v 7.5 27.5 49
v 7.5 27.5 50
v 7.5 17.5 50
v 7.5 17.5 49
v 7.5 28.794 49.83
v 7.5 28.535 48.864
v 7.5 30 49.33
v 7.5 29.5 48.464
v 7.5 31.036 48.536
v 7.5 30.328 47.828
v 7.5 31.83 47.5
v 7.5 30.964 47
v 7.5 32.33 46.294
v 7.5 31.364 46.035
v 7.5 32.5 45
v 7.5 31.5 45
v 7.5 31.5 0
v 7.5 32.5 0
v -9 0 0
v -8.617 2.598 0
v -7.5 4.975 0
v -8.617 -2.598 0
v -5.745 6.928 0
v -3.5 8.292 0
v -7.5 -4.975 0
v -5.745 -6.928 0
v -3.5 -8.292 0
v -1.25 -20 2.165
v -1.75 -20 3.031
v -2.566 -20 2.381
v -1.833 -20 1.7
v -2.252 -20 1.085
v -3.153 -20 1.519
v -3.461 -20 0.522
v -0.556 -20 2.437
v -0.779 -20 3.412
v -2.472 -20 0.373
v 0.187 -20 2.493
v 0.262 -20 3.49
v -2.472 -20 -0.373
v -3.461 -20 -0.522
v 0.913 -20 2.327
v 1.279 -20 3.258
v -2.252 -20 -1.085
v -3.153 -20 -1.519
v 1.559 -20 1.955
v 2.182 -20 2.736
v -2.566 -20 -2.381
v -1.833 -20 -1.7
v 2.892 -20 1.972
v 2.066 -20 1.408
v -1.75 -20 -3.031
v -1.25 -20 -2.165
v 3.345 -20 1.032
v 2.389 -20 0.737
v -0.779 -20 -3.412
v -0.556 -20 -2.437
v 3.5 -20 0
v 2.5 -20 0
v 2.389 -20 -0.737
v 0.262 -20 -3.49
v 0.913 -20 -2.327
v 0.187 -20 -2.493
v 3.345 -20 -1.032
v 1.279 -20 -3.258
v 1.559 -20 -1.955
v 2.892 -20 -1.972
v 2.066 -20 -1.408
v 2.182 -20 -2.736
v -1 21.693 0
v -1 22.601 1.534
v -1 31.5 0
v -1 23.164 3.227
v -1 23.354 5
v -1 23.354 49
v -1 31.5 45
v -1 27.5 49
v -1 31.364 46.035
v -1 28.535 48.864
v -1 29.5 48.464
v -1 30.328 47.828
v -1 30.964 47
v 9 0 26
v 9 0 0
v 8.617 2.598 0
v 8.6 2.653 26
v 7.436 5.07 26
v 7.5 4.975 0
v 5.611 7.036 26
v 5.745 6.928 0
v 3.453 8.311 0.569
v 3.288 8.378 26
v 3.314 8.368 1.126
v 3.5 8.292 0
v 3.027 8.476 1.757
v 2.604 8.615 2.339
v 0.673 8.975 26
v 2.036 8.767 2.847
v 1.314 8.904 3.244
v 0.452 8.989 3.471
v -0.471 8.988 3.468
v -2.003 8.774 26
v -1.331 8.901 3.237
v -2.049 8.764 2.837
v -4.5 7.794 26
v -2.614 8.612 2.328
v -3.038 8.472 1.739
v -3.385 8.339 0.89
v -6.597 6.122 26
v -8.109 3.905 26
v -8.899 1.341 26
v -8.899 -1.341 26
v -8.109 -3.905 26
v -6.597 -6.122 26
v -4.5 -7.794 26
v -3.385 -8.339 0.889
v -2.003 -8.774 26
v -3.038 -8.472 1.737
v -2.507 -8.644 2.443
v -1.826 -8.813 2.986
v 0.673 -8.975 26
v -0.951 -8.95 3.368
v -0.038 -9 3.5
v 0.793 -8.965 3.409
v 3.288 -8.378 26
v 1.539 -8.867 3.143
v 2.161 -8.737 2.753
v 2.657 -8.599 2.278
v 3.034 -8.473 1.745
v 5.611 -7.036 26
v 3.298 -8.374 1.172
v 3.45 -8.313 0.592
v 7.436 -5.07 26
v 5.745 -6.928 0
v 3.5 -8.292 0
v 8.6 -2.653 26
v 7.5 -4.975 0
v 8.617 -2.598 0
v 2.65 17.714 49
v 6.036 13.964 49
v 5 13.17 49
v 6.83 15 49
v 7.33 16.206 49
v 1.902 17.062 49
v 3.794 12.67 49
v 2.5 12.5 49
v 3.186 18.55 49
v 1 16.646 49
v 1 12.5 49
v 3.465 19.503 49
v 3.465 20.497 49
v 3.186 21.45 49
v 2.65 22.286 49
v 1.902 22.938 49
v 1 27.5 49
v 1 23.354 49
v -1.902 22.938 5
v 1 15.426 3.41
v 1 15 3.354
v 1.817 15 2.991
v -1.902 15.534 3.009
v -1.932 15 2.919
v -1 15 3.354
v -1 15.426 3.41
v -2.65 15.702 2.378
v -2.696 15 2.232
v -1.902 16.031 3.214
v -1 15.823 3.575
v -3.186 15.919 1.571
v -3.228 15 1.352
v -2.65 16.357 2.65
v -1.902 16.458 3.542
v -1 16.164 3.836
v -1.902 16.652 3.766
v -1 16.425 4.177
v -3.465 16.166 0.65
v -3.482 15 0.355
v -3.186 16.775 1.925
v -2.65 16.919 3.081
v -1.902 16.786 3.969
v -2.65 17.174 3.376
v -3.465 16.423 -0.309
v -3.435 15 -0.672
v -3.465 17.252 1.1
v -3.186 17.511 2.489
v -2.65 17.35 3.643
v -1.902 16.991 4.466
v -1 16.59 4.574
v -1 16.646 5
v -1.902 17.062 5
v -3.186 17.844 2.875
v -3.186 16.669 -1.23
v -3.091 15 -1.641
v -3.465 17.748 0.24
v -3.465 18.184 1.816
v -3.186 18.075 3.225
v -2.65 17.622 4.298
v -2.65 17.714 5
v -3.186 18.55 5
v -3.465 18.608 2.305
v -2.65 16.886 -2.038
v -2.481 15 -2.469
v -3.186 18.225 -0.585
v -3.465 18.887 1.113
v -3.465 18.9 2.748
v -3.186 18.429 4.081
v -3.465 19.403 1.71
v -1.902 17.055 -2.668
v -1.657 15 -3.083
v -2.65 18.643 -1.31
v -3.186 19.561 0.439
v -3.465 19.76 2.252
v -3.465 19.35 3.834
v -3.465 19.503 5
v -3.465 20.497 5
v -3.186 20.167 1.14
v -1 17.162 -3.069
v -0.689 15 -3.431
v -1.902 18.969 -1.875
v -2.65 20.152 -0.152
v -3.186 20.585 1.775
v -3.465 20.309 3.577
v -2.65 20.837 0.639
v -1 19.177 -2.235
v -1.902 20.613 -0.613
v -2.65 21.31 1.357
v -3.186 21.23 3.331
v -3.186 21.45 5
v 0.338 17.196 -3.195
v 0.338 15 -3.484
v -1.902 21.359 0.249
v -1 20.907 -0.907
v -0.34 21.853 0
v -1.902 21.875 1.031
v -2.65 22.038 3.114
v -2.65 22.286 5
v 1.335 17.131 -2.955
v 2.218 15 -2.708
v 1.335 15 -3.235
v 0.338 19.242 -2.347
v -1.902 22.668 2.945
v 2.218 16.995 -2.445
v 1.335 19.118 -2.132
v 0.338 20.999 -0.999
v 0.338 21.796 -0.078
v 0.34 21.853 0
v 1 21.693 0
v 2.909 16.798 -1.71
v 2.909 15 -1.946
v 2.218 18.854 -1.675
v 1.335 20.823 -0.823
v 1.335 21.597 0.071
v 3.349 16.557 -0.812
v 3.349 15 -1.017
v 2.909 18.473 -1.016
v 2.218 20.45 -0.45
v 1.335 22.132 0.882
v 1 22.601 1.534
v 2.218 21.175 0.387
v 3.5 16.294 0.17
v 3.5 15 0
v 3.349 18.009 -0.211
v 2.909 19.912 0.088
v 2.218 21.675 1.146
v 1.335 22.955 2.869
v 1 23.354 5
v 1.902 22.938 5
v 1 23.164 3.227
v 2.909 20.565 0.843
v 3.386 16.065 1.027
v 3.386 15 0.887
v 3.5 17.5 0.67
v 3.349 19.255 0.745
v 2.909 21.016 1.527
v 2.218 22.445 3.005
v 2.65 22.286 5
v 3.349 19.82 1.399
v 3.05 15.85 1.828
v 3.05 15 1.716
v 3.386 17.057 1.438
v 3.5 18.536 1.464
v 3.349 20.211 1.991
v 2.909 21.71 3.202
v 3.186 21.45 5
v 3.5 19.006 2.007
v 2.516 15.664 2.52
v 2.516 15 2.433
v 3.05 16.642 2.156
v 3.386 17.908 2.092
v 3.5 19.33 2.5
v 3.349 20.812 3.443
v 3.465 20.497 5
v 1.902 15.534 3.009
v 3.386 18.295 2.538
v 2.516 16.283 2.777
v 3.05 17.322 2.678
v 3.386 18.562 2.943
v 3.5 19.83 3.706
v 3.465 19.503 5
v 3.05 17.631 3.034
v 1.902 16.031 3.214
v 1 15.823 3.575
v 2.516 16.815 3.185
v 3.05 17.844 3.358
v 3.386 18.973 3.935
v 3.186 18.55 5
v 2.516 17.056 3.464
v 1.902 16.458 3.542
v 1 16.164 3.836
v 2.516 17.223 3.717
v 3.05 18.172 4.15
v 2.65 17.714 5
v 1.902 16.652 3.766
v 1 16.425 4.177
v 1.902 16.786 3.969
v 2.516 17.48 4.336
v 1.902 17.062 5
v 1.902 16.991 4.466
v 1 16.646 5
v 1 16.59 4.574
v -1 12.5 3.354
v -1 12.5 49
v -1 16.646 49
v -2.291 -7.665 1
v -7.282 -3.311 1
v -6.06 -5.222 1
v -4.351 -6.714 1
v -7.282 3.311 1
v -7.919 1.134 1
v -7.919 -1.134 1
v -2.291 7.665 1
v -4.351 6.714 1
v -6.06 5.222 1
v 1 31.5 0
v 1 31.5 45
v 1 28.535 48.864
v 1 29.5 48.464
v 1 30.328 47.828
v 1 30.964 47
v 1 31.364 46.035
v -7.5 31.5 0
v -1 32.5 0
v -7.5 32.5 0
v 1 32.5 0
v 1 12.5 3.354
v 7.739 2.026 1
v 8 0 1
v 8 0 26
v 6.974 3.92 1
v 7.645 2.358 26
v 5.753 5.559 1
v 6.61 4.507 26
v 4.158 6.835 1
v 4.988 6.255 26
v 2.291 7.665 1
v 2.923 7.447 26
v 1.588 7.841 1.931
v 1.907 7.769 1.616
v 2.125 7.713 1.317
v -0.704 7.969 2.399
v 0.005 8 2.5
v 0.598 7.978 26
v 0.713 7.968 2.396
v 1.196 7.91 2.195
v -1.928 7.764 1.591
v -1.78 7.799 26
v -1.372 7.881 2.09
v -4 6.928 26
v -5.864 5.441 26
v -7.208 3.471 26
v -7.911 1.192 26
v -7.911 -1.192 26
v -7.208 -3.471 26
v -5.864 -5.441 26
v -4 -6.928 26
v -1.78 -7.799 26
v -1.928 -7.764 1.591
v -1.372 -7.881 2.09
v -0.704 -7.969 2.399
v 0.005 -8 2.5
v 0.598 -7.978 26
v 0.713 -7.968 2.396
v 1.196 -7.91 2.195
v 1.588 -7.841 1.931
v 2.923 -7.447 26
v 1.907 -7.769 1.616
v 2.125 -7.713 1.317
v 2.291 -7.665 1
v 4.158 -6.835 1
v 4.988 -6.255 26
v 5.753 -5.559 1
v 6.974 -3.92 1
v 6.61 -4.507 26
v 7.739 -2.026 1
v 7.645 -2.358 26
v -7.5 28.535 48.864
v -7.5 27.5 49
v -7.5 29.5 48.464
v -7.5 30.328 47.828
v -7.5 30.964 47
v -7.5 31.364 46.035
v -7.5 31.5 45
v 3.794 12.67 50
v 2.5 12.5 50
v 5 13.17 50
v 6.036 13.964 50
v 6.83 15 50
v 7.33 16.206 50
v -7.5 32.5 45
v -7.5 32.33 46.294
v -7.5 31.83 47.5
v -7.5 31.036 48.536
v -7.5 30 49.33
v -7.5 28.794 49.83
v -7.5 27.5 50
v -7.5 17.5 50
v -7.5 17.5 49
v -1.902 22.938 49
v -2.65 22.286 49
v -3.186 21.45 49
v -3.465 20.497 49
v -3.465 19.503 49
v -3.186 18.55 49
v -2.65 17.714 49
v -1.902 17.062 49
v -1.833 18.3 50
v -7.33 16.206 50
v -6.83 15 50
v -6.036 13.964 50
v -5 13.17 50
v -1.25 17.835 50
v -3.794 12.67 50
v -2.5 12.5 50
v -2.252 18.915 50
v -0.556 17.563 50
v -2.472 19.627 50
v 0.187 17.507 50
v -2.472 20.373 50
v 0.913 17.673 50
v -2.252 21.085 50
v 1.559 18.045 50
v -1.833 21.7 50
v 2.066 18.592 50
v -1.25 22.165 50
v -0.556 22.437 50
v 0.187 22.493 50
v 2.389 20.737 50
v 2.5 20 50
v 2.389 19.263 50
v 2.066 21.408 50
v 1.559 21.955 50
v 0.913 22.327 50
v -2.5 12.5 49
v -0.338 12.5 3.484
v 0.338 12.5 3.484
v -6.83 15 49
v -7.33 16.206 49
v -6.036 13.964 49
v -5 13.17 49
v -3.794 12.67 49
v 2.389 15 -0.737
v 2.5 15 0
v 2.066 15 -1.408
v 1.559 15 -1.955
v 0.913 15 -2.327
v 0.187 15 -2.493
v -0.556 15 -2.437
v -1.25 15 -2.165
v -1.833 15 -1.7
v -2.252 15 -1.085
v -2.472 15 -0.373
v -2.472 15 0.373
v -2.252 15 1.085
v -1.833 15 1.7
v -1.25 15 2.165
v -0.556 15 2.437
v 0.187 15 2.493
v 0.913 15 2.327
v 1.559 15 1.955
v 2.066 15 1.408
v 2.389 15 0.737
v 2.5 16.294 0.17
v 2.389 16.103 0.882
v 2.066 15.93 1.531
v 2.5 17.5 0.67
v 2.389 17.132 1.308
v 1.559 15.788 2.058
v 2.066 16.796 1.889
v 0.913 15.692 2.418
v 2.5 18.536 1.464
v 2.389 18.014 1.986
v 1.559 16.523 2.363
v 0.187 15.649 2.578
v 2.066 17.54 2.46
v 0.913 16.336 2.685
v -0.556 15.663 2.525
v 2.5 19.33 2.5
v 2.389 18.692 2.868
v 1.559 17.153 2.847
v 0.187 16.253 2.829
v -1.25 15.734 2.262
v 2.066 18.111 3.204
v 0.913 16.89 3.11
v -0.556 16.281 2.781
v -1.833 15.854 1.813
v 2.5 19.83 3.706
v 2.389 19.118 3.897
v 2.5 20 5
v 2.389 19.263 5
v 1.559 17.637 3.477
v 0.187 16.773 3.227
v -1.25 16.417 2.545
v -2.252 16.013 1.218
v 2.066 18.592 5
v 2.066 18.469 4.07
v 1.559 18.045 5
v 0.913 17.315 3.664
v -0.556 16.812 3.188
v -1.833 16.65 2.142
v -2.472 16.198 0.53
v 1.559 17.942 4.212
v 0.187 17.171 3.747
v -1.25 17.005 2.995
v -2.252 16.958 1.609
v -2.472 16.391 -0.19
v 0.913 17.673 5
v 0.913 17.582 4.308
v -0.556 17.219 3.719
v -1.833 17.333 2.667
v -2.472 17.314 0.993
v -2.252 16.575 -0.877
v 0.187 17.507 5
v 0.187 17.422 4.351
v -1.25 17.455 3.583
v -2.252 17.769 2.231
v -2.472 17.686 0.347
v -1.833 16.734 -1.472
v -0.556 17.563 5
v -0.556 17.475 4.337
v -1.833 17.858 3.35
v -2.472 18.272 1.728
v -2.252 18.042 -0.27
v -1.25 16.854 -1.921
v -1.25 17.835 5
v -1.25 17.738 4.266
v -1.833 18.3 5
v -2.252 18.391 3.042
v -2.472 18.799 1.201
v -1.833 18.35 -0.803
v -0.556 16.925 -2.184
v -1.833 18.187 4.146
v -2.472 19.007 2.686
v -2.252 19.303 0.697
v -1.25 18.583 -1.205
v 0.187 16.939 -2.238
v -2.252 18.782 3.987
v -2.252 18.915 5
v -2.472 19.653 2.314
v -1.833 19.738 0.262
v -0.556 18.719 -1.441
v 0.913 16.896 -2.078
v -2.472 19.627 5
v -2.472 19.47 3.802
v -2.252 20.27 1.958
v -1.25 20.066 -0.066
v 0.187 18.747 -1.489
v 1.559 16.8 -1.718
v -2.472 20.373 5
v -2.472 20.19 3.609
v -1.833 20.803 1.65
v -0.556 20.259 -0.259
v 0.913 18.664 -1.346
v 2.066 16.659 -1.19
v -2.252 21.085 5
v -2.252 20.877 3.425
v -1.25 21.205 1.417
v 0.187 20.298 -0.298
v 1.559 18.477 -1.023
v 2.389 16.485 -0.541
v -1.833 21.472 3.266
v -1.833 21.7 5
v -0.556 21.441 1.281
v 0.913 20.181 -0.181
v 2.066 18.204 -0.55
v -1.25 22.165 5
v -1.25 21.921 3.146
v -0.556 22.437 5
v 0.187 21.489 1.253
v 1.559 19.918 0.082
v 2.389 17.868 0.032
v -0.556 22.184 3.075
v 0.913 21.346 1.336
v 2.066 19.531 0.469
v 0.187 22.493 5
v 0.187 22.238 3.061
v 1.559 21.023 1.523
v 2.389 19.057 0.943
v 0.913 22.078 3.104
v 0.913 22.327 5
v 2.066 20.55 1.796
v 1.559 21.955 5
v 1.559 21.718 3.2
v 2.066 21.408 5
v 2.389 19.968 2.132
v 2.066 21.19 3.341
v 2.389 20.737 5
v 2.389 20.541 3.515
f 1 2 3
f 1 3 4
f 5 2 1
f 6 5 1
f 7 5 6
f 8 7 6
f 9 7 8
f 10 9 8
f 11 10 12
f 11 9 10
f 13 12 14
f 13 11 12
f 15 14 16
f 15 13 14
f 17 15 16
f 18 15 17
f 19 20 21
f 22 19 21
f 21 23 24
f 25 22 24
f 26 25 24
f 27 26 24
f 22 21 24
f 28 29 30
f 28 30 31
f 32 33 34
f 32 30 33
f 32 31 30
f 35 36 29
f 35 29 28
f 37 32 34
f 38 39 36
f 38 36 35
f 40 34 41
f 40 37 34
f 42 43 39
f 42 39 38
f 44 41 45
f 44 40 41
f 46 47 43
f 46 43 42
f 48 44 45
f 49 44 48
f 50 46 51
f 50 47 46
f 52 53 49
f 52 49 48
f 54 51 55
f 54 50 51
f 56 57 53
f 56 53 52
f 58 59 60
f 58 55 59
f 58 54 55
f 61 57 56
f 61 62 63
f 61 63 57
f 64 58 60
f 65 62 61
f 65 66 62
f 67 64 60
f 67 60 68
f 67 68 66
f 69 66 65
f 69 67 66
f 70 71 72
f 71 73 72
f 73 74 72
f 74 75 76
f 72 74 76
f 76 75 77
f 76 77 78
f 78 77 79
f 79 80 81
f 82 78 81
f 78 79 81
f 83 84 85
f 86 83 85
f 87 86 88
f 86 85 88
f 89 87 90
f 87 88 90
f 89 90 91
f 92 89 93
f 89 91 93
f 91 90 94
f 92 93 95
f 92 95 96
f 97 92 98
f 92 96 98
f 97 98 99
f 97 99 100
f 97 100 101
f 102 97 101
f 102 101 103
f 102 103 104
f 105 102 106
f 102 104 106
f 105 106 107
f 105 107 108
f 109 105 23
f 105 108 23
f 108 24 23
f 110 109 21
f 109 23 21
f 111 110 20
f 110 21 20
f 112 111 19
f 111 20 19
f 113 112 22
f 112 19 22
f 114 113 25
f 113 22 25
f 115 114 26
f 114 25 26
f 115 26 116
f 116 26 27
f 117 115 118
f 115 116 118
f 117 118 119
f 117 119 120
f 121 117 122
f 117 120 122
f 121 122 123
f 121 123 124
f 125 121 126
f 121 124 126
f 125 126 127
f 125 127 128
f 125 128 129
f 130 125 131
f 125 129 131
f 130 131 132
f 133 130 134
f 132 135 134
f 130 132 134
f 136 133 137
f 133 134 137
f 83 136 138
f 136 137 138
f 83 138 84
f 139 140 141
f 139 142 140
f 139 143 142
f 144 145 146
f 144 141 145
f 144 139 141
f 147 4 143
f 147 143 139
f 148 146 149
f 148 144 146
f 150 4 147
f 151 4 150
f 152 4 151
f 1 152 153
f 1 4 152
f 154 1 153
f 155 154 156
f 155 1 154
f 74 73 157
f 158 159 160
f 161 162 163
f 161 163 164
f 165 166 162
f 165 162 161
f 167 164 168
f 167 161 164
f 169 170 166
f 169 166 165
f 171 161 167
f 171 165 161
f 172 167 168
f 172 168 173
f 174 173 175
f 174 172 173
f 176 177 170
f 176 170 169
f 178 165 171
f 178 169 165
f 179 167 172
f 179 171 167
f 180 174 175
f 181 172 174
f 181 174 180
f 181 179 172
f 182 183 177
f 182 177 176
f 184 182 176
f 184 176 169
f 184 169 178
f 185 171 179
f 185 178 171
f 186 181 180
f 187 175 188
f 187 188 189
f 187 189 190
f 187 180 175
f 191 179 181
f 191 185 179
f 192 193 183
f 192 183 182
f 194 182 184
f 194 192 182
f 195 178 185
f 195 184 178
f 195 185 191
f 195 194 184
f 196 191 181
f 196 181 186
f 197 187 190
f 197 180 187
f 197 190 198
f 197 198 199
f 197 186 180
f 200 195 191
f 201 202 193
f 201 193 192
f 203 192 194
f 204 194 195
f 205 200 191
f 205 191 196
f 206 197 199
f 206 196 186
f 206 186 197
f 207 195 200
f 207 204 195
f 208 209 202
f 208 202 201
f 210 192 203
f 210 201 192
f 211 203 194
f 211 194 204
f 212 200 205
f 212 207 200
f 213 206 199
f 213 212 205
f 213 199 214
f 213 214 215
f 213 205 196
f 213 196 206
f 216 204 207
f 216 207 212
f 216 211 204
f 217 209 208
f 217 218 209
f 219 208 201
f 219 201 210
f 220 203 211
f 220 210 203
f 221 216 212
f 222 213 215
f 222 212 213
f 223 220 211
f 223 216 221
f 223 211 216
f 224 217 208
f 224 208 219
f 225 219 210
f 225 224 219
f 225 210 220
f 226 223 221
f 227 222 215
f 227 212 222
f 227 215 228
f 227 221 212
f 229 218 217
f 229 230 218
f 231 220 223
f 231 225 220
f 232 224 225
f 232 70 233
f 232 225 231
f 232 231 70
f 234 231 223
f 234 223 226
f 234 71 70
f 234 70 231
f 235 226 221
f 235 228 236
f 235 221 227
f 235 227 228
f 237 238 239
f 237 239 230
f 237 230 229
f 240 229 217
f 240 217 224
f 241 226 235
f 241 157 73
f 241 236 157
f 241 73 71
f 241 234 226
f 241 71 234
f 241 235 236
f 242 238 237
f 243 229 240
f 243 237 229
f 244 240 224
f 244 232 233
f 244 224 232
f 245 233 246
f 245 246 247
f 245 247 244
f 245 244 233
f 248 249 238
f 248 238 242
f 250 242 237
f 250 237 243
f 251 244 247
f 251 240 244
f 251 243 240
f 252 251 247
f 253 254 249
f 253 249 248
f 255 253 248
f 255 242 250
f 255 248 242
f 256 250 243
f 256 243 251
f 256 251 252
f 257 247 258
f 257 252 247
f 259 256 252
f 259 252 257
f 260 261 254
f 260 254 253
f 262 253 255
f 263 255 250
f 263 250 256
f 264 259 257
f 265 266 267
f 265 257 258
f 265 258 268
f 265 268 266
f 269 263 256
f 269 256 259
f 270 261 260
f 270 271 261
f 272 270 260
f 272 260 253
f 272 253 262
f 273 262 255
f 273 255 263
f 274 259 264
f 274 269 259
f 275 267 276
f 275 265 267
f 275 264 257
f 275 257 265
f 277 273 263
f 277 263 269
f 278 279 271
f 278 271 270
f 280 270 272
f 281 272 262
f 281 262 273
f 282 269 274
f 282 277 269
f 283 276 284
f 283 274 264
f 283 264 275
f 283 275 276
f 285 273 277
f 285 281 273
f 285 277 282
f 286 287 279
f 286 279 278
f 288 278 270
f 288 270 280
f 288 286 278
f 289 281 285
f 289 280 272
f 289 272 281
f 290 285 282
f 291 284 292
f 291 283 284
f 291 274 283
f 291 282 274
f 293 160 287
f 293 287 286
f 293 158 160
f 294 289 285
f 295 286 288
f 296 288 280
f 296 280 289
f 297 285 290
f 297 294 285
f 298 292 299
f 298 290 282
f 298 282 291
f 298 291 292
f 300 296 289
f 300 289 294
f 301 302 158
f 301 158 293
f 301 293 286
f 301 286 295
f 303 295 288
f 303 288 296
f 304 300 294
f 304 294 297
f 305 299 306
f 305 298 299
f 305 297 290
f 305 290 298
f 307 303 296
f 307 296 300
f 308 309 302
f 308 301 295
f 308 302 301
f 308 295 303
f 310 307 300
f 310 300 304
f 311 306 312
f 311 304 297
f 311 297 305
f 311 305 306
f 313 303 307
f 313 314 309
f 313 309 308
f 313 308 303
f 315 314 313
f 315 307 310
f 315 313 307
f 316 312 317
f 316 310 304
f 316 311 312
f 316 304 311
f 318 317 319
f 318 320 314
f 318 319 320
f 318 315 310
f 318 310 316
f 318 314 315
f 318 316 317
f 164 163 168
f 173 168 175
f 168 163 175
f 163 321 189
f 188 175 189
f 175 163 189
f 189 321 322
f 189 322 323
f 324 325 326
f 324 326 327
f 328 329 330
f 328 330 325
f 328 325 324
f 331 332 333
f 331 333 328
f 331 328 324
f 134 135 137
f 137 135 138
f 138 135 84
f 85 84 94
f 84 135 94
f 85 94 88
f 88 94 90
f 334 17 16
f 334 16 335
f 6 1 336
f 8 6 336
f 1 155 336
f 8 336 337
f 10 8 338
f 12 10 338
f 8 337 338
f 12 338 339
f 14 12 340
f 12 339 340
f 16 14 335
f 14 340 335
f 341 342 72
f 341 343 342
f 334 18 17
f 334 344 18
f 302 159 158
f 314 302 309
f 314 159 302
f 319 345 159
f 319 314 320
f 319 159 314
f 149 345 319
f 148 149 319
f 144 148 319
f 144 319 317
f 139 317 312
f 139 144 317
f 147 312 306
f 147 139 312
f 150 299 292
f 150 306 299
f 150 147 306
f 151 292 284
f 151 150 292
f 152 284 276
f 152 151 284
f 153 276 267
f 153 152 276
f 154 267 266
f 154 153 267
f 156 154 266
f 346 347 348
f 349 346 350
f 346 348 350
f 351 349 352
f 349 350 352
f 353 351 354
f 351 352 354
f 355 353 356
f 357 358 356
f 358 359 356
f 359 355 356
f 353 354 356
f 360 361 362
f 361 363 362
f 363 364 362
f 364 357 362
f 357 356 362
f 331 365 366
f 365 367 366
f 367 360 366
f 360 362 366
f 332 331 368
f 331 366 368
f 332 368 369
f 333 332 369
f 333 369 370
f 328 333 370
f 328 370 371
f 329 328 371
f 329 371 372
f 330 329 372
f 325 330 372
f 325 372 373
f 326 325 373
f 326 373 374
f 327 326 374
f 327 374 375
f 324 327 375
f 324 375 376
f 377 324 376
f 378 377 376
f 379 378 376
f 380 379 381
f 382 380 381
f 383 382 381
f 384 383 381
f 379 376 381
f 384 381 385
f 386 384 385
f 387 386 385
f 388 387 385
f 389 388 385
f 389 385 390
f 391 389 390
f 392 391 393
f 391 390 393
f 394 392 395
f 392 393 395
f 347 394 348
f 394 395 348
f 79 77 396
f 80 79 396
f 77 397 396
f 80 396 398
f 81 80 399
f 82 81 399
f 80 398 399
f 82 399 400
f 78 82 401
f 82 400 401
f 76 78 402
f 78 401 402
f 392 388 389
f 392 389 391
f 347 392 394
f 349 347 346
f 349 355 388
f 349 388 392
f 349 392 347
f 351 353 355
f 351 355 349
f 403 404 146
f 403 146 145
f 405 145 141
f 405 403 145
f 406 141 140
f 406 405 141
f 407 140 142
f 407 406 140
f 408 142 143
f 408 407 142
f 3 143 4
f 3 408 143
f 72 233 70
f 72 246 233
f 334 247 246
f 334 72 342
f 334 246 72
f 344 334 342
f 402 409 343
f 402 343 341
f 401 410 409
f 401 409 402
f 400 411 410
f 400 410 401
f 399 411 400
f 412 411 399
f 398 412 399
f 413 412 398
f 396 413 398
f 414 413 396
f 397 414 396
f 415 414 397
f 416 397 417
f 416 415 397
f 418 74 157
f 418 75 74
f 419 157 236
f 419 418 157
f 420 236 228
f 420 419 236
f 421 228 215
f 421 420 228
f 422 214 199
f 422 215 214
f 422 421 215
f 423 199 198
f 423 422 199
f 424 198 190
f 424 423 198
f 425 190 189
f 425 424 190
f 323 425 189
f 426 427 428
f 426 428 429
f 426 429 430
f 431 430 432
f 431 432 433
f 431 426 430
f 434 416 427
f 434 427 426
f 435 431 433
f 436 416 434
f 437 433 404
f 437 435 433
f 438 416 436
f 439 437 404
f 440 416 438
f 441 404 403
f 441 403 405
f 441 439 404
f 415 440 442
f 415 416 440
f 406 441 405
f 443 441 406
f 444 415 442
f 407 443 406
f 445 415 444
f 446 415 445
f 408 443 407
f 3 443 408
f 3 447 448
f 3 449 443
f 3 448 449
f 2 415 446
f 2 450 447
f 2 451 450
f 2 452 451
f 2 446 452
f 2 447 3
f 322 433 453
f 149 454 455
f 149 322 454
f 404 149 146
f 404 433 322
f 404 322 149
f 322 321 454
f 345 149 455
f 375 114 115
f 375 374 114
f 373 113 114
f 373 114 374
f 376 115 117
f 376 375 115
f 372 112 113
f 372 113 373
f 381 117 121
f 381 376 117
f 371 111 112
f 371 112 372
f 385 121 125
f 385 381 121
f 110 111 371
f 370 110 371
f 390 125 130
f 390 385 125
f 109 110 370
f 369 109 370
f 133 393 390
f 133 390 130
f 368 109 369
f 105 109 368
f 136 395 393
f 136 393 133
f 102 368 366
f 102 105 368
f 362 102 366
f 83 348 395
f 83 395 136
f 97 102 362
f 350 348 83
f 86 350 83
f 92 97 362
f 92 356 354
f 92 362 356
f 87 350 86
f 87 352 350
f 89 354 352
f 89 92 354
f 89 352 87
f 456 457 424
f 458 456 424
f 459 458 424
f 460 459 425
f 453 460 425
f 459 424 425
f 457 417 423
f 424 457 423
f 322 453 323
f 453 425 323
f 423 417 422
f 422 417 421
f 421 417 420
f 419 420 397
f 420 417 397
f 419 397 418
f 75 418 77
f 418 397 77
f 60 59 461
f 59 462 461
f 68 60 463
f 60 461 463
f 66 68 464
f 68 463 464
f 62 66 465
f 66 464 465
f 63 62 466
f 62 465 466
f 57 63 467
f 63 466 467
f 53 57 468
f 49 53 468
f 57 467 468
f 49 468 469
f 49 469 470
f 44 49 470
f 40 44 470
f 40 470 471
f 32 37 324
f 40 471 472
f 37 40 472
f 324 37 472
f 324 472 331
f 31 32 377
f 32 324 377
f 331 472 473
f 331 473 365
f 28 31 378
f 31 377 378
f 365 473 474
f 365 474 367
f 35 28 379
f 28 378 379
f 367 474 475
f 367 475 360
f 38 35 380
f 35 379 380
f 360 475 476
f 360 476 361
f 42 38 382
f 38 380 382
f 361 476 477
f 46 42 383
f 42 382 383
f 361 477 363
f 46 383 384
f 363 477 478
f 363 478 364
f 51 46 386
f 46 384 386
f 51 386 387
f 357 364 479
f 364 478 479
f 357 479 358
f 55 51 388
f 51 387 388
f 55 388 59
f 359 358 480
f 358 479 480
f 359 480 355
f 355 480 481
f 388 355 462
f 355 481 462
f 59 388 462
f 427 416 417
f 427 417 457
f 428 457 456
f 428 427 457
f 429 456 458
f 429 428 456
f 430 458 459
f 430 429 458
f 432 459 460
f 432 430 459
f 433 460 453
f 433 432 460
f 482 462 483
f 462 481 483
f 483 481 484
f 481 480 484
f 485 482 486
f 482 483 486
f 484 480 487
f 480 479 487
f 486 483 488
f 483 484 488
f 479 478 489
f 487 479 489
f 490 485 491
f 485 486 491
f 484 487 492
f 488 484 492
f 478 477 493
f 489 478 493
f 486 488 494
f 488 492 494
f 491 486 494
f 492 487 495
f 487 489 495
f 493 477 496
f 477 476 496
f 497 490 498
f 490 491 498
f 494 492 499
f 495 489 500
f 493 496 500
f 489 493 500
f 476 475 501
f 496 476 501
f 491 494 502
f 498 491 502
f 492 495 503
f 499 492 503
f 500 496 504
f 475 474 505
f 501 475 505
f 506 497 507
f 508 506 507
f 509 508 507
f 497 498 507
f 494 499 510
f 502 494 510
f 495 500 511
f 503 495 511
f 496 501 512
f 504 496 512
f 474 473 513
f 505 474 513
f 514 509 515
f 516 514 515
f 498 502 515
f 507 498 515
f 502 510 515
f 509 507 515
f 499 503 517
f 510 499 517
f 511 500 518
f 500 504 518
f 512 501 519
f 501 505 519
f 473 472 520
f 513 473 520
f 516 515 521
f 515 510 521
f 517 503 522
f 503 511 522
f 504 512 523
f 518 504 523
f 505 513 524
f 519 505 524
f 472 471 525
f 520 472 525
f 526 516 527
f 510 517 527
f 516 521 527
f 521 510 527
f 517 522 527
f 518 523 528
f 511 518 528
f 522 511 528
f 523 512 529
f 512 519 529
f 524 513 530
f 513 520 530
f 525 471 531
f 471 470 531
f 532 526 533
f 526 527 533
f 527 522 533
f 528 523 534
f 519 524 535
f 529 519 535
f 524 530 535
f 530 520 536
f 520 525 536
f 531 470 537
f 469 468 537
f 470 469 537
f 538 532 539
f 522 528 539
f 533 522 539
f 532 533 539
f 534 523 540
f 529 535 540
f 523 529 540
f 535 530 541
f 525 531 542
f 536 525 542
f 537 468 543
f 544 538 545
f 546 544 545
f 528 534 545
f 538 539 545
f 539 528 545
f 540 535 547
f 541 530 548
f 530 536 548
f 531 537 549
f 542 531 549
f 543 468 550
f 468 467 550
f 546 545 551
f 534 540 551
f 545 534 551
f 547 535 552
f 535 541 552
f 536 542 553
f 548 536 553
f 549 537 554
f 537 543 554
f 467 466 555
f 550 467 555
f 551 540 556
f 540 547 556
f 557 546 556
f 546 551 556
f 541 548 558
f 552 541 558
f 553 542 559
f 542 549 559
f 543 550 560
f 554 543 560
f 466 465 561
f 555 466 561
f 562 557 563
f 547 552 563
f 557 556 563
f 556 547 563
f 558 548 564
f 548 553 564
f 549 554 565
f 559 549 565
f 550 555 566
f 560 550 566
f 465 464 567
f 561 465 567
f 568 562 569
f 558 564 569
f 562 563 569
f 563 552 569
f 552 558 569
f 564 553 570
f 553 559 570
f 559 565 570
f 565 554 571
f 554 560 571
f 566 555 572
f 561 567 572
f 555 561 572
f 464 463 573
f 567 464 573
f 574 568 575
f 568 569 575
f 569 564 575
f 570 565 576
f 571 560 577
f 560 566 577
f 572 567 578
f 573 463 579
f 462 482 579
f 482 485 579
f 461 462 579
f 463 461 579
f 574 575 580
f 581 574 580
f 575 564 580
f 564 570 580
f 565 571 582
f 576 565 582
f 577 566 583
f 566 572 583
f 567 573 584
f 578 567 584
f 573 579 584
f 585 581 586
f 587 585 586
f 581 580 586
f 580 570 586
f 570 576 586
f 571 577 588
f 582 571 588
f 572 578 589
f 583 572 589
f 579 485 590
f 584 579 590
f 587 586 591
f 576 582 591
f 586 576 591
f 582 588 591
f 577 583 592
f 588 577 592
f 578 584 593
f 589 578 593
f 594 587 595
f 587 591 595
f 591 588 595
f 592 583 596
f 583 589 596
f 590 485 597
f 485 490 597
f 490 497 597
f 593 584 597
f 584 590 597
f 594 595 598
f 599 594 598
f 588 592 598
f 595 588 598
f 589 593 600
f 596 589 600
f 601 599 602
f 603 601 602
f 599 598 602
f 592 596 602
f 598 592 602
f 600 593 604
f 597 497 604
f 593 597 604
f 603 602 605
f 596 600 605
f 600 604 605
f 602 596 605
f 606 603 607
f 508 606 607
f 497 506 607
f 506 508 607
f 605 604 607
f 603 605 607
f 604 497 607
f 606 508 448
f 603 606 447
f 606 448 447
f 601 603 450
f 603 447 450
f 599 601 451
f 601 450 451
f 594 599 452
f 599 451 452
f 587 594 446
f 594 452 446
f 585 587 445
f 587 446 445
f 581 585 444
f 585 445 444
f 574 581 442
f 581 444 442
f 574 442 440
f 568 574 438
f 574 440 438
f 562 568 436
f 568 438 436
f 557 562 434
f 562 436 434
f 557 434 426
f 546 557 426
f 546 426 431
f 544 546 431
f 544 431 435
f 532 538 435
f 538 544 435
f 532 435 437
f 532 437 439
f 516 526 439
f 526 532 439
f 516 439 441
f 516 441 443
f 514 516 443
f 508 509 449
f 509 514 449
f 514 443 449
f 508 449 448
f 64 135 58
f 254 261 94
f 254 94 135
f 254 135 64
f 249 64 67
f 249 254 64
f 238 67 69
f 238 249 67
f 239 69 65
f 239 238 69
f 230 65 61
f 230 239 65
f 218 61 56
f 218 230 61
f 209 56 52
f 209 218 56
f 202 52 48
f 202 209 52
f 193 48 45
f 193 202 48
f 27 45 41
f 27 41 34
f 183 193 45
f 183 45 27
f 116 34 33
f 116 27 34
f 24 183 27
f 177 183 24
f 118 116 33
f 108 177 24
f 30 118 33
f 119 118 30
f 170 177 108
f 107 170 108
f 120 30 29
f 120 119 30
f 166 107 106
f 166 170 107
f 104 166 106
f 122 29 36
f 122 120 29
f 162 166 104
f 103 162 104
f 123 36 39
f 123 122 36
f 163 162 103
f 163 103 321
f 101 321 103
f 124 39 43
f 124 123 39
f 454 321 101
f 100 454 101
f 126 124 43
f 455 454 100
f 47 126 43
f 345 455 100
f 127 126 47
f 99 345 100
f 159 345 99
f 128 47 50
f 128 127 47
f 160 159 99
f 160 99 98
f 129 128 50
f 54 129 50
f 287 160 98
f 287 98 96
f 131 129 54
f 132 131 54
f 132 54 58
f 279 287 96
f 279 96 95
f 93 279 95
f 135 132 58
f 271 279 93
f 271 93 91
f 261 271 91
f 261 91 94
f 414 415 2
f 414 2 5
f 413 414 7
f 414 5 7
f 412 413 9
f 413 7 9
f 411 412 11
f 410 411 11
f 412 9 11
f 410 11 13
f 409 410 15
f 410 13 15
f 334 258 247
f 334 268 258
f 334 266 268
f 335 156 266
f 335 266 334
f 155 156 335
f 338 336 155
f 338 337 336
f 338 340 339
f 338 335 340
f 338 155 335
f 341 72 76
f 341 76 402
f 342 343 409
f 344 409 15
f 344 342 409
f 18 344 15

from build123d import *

# Parameters (mm, degrees)
F0_R       = 9
F1_DEPTH   = 26
F3_DEPTH   = 1
F4_R       = 3.5
F7_R       = 2.5
F9_R       = 8
F10_DEPTH  = 25
F13_DEPTH  = 1
F13_FACE_W = 6.5
F13_FACE_H = 1


with BuildPart() as f1:
    # F0 (on Top) → F1 (new body)
    with BuildSketch(Plane.XY):
        Circle(F0_R)
    extrude(amount=F1_DEPTH)



with BuildPart() as f3:
    # F2 (on Right) → F3 (new body, symmetric)
    with BuildSketch(Plane.YZ):
        with BuildLine():
            Line((12.5, 0), (32.5, 0))
            Line((32.5, 0), (32.5, 45))
            ThreePointArc((32.5, 45), (31.0355339059, 48.5355339059), (27.5, 50))
            Line((27.5, 50), (12.5, 50))
            Line((12.5, 50), (12.5, 0))
        make_face()
    extrude(amount=F3_DEPTH, both=True)


with BuildPart() as f1_1:
    add(f1.part)

    add(f3.part)  # F6 merges F3
    # F6: sweep along a path in F5
    with BuildLine(Plane.YZ) as f6_path:
        Line((-20, 0), (0, 0))
        Line((0, 0), (15, 0))
        ThreePointArc((15, 0), (18.5355339059, 1.4644660941), (20, 5))
        Line((20, 5), (20, 50))
    # F4 (on Front) → F6 (sweep)
    with BuildSketch(Plane.XZ):
        Circle(F4_R)
    sweep(path=f6_path.line)

    # F8: sweep along a path in F5
    with BuildLine(Plane.YZ) as f8_path:
        Line((-20, 0), (0, 0))
        Line((0, 0), (15, 0))
        ThreePointArc((15, 0), (18.5355339059, 1.4644660941), (20, 5))
        Line((20, 5), (20, 50))
    # F7 (on face) → F8 (sweep, cut)
    with BuildSketch(Plane.XZ.offset(20)):
        Circle(F7_R)
    sweep(path=f8_path.line, mode=Mode.SUBTRACT)

    # F9 (on face) → F10 (cut)
    with BuildSketch(Plane.XY.offset(26)):
        Circle(F9_R)
    extrude(amount=-F10_DEPTH, mode=Mode.SUBTRACT)

    # F12 (on face) → F13 (join)
    with BuildSketch(Plane.XY.offset(50)):
        with BuildLine():
            Line((7.5, 25), (1, 25))
            Line((1, 25), (1, 23.3541019662))
            ThreePointArc((1, 23.3541019662), (3.5, 20), (1, 16.6458980338))
            Line((1, 16.6458980338), (1, 12.5))
            Line((1, 12.5), (2.5, 12.5))
            ThreePointArc((2.5, 12.5), (6.0355339059, 13.9644660941), (7.5, 17.5))
            Line((7.5, 17.5), (7.5, 25))
        make_face()
        with BuildLine():
            Line((-1, 25), (-7.5, 25))
            Line((-7.5, 25), (-7.5, 17.5))
            ThreePointArc((-7.5, 17.5), (-6.0355339059, 13.9644660941), (-2.5, 12.5))
            Line((-2.5, 12.5), (-1, 12.5))
            Line((-1, 12.5), (-1, 16.6458980338))
            ThreePointArc((-1, 16.6458980338), (-3.5, 20), (-1, 23.3541019662))
            Line((-1, 23.3541019662), (-1, 25))
        make_face()
    extrude(amount=-F13_DEPTH)

    # F14: sweep along a path in F14_path
    with BuildLine(Plane(origin=(1, 27.5, 50), x_dir=(0, 0, 1), z_dir=(1, 0, 0))) as f14_path:
        Line((0, 2.5), (0, 0))
        ThreePointArc((0, 0), (-1.4644660941, -3.5355339059), (-5, -5))
        Line((-5, -5), (-50, -5))
    # F13_face (on face) → F14 (sweep)
    with BuildSketch(Plane(origin=(4.25, 25, 49.5), x_dir=(-1, 0, 0), z_dir=(0, 1, 0))):
        Rectangle(F13_FACE_W, F13_FACE_H)
        with Locations((8.5, 0)):
            Rectangle(F13_FACE_W, F13_FACE_H)
    sweep(path=f14_path.line)


solid = f1_1.part
